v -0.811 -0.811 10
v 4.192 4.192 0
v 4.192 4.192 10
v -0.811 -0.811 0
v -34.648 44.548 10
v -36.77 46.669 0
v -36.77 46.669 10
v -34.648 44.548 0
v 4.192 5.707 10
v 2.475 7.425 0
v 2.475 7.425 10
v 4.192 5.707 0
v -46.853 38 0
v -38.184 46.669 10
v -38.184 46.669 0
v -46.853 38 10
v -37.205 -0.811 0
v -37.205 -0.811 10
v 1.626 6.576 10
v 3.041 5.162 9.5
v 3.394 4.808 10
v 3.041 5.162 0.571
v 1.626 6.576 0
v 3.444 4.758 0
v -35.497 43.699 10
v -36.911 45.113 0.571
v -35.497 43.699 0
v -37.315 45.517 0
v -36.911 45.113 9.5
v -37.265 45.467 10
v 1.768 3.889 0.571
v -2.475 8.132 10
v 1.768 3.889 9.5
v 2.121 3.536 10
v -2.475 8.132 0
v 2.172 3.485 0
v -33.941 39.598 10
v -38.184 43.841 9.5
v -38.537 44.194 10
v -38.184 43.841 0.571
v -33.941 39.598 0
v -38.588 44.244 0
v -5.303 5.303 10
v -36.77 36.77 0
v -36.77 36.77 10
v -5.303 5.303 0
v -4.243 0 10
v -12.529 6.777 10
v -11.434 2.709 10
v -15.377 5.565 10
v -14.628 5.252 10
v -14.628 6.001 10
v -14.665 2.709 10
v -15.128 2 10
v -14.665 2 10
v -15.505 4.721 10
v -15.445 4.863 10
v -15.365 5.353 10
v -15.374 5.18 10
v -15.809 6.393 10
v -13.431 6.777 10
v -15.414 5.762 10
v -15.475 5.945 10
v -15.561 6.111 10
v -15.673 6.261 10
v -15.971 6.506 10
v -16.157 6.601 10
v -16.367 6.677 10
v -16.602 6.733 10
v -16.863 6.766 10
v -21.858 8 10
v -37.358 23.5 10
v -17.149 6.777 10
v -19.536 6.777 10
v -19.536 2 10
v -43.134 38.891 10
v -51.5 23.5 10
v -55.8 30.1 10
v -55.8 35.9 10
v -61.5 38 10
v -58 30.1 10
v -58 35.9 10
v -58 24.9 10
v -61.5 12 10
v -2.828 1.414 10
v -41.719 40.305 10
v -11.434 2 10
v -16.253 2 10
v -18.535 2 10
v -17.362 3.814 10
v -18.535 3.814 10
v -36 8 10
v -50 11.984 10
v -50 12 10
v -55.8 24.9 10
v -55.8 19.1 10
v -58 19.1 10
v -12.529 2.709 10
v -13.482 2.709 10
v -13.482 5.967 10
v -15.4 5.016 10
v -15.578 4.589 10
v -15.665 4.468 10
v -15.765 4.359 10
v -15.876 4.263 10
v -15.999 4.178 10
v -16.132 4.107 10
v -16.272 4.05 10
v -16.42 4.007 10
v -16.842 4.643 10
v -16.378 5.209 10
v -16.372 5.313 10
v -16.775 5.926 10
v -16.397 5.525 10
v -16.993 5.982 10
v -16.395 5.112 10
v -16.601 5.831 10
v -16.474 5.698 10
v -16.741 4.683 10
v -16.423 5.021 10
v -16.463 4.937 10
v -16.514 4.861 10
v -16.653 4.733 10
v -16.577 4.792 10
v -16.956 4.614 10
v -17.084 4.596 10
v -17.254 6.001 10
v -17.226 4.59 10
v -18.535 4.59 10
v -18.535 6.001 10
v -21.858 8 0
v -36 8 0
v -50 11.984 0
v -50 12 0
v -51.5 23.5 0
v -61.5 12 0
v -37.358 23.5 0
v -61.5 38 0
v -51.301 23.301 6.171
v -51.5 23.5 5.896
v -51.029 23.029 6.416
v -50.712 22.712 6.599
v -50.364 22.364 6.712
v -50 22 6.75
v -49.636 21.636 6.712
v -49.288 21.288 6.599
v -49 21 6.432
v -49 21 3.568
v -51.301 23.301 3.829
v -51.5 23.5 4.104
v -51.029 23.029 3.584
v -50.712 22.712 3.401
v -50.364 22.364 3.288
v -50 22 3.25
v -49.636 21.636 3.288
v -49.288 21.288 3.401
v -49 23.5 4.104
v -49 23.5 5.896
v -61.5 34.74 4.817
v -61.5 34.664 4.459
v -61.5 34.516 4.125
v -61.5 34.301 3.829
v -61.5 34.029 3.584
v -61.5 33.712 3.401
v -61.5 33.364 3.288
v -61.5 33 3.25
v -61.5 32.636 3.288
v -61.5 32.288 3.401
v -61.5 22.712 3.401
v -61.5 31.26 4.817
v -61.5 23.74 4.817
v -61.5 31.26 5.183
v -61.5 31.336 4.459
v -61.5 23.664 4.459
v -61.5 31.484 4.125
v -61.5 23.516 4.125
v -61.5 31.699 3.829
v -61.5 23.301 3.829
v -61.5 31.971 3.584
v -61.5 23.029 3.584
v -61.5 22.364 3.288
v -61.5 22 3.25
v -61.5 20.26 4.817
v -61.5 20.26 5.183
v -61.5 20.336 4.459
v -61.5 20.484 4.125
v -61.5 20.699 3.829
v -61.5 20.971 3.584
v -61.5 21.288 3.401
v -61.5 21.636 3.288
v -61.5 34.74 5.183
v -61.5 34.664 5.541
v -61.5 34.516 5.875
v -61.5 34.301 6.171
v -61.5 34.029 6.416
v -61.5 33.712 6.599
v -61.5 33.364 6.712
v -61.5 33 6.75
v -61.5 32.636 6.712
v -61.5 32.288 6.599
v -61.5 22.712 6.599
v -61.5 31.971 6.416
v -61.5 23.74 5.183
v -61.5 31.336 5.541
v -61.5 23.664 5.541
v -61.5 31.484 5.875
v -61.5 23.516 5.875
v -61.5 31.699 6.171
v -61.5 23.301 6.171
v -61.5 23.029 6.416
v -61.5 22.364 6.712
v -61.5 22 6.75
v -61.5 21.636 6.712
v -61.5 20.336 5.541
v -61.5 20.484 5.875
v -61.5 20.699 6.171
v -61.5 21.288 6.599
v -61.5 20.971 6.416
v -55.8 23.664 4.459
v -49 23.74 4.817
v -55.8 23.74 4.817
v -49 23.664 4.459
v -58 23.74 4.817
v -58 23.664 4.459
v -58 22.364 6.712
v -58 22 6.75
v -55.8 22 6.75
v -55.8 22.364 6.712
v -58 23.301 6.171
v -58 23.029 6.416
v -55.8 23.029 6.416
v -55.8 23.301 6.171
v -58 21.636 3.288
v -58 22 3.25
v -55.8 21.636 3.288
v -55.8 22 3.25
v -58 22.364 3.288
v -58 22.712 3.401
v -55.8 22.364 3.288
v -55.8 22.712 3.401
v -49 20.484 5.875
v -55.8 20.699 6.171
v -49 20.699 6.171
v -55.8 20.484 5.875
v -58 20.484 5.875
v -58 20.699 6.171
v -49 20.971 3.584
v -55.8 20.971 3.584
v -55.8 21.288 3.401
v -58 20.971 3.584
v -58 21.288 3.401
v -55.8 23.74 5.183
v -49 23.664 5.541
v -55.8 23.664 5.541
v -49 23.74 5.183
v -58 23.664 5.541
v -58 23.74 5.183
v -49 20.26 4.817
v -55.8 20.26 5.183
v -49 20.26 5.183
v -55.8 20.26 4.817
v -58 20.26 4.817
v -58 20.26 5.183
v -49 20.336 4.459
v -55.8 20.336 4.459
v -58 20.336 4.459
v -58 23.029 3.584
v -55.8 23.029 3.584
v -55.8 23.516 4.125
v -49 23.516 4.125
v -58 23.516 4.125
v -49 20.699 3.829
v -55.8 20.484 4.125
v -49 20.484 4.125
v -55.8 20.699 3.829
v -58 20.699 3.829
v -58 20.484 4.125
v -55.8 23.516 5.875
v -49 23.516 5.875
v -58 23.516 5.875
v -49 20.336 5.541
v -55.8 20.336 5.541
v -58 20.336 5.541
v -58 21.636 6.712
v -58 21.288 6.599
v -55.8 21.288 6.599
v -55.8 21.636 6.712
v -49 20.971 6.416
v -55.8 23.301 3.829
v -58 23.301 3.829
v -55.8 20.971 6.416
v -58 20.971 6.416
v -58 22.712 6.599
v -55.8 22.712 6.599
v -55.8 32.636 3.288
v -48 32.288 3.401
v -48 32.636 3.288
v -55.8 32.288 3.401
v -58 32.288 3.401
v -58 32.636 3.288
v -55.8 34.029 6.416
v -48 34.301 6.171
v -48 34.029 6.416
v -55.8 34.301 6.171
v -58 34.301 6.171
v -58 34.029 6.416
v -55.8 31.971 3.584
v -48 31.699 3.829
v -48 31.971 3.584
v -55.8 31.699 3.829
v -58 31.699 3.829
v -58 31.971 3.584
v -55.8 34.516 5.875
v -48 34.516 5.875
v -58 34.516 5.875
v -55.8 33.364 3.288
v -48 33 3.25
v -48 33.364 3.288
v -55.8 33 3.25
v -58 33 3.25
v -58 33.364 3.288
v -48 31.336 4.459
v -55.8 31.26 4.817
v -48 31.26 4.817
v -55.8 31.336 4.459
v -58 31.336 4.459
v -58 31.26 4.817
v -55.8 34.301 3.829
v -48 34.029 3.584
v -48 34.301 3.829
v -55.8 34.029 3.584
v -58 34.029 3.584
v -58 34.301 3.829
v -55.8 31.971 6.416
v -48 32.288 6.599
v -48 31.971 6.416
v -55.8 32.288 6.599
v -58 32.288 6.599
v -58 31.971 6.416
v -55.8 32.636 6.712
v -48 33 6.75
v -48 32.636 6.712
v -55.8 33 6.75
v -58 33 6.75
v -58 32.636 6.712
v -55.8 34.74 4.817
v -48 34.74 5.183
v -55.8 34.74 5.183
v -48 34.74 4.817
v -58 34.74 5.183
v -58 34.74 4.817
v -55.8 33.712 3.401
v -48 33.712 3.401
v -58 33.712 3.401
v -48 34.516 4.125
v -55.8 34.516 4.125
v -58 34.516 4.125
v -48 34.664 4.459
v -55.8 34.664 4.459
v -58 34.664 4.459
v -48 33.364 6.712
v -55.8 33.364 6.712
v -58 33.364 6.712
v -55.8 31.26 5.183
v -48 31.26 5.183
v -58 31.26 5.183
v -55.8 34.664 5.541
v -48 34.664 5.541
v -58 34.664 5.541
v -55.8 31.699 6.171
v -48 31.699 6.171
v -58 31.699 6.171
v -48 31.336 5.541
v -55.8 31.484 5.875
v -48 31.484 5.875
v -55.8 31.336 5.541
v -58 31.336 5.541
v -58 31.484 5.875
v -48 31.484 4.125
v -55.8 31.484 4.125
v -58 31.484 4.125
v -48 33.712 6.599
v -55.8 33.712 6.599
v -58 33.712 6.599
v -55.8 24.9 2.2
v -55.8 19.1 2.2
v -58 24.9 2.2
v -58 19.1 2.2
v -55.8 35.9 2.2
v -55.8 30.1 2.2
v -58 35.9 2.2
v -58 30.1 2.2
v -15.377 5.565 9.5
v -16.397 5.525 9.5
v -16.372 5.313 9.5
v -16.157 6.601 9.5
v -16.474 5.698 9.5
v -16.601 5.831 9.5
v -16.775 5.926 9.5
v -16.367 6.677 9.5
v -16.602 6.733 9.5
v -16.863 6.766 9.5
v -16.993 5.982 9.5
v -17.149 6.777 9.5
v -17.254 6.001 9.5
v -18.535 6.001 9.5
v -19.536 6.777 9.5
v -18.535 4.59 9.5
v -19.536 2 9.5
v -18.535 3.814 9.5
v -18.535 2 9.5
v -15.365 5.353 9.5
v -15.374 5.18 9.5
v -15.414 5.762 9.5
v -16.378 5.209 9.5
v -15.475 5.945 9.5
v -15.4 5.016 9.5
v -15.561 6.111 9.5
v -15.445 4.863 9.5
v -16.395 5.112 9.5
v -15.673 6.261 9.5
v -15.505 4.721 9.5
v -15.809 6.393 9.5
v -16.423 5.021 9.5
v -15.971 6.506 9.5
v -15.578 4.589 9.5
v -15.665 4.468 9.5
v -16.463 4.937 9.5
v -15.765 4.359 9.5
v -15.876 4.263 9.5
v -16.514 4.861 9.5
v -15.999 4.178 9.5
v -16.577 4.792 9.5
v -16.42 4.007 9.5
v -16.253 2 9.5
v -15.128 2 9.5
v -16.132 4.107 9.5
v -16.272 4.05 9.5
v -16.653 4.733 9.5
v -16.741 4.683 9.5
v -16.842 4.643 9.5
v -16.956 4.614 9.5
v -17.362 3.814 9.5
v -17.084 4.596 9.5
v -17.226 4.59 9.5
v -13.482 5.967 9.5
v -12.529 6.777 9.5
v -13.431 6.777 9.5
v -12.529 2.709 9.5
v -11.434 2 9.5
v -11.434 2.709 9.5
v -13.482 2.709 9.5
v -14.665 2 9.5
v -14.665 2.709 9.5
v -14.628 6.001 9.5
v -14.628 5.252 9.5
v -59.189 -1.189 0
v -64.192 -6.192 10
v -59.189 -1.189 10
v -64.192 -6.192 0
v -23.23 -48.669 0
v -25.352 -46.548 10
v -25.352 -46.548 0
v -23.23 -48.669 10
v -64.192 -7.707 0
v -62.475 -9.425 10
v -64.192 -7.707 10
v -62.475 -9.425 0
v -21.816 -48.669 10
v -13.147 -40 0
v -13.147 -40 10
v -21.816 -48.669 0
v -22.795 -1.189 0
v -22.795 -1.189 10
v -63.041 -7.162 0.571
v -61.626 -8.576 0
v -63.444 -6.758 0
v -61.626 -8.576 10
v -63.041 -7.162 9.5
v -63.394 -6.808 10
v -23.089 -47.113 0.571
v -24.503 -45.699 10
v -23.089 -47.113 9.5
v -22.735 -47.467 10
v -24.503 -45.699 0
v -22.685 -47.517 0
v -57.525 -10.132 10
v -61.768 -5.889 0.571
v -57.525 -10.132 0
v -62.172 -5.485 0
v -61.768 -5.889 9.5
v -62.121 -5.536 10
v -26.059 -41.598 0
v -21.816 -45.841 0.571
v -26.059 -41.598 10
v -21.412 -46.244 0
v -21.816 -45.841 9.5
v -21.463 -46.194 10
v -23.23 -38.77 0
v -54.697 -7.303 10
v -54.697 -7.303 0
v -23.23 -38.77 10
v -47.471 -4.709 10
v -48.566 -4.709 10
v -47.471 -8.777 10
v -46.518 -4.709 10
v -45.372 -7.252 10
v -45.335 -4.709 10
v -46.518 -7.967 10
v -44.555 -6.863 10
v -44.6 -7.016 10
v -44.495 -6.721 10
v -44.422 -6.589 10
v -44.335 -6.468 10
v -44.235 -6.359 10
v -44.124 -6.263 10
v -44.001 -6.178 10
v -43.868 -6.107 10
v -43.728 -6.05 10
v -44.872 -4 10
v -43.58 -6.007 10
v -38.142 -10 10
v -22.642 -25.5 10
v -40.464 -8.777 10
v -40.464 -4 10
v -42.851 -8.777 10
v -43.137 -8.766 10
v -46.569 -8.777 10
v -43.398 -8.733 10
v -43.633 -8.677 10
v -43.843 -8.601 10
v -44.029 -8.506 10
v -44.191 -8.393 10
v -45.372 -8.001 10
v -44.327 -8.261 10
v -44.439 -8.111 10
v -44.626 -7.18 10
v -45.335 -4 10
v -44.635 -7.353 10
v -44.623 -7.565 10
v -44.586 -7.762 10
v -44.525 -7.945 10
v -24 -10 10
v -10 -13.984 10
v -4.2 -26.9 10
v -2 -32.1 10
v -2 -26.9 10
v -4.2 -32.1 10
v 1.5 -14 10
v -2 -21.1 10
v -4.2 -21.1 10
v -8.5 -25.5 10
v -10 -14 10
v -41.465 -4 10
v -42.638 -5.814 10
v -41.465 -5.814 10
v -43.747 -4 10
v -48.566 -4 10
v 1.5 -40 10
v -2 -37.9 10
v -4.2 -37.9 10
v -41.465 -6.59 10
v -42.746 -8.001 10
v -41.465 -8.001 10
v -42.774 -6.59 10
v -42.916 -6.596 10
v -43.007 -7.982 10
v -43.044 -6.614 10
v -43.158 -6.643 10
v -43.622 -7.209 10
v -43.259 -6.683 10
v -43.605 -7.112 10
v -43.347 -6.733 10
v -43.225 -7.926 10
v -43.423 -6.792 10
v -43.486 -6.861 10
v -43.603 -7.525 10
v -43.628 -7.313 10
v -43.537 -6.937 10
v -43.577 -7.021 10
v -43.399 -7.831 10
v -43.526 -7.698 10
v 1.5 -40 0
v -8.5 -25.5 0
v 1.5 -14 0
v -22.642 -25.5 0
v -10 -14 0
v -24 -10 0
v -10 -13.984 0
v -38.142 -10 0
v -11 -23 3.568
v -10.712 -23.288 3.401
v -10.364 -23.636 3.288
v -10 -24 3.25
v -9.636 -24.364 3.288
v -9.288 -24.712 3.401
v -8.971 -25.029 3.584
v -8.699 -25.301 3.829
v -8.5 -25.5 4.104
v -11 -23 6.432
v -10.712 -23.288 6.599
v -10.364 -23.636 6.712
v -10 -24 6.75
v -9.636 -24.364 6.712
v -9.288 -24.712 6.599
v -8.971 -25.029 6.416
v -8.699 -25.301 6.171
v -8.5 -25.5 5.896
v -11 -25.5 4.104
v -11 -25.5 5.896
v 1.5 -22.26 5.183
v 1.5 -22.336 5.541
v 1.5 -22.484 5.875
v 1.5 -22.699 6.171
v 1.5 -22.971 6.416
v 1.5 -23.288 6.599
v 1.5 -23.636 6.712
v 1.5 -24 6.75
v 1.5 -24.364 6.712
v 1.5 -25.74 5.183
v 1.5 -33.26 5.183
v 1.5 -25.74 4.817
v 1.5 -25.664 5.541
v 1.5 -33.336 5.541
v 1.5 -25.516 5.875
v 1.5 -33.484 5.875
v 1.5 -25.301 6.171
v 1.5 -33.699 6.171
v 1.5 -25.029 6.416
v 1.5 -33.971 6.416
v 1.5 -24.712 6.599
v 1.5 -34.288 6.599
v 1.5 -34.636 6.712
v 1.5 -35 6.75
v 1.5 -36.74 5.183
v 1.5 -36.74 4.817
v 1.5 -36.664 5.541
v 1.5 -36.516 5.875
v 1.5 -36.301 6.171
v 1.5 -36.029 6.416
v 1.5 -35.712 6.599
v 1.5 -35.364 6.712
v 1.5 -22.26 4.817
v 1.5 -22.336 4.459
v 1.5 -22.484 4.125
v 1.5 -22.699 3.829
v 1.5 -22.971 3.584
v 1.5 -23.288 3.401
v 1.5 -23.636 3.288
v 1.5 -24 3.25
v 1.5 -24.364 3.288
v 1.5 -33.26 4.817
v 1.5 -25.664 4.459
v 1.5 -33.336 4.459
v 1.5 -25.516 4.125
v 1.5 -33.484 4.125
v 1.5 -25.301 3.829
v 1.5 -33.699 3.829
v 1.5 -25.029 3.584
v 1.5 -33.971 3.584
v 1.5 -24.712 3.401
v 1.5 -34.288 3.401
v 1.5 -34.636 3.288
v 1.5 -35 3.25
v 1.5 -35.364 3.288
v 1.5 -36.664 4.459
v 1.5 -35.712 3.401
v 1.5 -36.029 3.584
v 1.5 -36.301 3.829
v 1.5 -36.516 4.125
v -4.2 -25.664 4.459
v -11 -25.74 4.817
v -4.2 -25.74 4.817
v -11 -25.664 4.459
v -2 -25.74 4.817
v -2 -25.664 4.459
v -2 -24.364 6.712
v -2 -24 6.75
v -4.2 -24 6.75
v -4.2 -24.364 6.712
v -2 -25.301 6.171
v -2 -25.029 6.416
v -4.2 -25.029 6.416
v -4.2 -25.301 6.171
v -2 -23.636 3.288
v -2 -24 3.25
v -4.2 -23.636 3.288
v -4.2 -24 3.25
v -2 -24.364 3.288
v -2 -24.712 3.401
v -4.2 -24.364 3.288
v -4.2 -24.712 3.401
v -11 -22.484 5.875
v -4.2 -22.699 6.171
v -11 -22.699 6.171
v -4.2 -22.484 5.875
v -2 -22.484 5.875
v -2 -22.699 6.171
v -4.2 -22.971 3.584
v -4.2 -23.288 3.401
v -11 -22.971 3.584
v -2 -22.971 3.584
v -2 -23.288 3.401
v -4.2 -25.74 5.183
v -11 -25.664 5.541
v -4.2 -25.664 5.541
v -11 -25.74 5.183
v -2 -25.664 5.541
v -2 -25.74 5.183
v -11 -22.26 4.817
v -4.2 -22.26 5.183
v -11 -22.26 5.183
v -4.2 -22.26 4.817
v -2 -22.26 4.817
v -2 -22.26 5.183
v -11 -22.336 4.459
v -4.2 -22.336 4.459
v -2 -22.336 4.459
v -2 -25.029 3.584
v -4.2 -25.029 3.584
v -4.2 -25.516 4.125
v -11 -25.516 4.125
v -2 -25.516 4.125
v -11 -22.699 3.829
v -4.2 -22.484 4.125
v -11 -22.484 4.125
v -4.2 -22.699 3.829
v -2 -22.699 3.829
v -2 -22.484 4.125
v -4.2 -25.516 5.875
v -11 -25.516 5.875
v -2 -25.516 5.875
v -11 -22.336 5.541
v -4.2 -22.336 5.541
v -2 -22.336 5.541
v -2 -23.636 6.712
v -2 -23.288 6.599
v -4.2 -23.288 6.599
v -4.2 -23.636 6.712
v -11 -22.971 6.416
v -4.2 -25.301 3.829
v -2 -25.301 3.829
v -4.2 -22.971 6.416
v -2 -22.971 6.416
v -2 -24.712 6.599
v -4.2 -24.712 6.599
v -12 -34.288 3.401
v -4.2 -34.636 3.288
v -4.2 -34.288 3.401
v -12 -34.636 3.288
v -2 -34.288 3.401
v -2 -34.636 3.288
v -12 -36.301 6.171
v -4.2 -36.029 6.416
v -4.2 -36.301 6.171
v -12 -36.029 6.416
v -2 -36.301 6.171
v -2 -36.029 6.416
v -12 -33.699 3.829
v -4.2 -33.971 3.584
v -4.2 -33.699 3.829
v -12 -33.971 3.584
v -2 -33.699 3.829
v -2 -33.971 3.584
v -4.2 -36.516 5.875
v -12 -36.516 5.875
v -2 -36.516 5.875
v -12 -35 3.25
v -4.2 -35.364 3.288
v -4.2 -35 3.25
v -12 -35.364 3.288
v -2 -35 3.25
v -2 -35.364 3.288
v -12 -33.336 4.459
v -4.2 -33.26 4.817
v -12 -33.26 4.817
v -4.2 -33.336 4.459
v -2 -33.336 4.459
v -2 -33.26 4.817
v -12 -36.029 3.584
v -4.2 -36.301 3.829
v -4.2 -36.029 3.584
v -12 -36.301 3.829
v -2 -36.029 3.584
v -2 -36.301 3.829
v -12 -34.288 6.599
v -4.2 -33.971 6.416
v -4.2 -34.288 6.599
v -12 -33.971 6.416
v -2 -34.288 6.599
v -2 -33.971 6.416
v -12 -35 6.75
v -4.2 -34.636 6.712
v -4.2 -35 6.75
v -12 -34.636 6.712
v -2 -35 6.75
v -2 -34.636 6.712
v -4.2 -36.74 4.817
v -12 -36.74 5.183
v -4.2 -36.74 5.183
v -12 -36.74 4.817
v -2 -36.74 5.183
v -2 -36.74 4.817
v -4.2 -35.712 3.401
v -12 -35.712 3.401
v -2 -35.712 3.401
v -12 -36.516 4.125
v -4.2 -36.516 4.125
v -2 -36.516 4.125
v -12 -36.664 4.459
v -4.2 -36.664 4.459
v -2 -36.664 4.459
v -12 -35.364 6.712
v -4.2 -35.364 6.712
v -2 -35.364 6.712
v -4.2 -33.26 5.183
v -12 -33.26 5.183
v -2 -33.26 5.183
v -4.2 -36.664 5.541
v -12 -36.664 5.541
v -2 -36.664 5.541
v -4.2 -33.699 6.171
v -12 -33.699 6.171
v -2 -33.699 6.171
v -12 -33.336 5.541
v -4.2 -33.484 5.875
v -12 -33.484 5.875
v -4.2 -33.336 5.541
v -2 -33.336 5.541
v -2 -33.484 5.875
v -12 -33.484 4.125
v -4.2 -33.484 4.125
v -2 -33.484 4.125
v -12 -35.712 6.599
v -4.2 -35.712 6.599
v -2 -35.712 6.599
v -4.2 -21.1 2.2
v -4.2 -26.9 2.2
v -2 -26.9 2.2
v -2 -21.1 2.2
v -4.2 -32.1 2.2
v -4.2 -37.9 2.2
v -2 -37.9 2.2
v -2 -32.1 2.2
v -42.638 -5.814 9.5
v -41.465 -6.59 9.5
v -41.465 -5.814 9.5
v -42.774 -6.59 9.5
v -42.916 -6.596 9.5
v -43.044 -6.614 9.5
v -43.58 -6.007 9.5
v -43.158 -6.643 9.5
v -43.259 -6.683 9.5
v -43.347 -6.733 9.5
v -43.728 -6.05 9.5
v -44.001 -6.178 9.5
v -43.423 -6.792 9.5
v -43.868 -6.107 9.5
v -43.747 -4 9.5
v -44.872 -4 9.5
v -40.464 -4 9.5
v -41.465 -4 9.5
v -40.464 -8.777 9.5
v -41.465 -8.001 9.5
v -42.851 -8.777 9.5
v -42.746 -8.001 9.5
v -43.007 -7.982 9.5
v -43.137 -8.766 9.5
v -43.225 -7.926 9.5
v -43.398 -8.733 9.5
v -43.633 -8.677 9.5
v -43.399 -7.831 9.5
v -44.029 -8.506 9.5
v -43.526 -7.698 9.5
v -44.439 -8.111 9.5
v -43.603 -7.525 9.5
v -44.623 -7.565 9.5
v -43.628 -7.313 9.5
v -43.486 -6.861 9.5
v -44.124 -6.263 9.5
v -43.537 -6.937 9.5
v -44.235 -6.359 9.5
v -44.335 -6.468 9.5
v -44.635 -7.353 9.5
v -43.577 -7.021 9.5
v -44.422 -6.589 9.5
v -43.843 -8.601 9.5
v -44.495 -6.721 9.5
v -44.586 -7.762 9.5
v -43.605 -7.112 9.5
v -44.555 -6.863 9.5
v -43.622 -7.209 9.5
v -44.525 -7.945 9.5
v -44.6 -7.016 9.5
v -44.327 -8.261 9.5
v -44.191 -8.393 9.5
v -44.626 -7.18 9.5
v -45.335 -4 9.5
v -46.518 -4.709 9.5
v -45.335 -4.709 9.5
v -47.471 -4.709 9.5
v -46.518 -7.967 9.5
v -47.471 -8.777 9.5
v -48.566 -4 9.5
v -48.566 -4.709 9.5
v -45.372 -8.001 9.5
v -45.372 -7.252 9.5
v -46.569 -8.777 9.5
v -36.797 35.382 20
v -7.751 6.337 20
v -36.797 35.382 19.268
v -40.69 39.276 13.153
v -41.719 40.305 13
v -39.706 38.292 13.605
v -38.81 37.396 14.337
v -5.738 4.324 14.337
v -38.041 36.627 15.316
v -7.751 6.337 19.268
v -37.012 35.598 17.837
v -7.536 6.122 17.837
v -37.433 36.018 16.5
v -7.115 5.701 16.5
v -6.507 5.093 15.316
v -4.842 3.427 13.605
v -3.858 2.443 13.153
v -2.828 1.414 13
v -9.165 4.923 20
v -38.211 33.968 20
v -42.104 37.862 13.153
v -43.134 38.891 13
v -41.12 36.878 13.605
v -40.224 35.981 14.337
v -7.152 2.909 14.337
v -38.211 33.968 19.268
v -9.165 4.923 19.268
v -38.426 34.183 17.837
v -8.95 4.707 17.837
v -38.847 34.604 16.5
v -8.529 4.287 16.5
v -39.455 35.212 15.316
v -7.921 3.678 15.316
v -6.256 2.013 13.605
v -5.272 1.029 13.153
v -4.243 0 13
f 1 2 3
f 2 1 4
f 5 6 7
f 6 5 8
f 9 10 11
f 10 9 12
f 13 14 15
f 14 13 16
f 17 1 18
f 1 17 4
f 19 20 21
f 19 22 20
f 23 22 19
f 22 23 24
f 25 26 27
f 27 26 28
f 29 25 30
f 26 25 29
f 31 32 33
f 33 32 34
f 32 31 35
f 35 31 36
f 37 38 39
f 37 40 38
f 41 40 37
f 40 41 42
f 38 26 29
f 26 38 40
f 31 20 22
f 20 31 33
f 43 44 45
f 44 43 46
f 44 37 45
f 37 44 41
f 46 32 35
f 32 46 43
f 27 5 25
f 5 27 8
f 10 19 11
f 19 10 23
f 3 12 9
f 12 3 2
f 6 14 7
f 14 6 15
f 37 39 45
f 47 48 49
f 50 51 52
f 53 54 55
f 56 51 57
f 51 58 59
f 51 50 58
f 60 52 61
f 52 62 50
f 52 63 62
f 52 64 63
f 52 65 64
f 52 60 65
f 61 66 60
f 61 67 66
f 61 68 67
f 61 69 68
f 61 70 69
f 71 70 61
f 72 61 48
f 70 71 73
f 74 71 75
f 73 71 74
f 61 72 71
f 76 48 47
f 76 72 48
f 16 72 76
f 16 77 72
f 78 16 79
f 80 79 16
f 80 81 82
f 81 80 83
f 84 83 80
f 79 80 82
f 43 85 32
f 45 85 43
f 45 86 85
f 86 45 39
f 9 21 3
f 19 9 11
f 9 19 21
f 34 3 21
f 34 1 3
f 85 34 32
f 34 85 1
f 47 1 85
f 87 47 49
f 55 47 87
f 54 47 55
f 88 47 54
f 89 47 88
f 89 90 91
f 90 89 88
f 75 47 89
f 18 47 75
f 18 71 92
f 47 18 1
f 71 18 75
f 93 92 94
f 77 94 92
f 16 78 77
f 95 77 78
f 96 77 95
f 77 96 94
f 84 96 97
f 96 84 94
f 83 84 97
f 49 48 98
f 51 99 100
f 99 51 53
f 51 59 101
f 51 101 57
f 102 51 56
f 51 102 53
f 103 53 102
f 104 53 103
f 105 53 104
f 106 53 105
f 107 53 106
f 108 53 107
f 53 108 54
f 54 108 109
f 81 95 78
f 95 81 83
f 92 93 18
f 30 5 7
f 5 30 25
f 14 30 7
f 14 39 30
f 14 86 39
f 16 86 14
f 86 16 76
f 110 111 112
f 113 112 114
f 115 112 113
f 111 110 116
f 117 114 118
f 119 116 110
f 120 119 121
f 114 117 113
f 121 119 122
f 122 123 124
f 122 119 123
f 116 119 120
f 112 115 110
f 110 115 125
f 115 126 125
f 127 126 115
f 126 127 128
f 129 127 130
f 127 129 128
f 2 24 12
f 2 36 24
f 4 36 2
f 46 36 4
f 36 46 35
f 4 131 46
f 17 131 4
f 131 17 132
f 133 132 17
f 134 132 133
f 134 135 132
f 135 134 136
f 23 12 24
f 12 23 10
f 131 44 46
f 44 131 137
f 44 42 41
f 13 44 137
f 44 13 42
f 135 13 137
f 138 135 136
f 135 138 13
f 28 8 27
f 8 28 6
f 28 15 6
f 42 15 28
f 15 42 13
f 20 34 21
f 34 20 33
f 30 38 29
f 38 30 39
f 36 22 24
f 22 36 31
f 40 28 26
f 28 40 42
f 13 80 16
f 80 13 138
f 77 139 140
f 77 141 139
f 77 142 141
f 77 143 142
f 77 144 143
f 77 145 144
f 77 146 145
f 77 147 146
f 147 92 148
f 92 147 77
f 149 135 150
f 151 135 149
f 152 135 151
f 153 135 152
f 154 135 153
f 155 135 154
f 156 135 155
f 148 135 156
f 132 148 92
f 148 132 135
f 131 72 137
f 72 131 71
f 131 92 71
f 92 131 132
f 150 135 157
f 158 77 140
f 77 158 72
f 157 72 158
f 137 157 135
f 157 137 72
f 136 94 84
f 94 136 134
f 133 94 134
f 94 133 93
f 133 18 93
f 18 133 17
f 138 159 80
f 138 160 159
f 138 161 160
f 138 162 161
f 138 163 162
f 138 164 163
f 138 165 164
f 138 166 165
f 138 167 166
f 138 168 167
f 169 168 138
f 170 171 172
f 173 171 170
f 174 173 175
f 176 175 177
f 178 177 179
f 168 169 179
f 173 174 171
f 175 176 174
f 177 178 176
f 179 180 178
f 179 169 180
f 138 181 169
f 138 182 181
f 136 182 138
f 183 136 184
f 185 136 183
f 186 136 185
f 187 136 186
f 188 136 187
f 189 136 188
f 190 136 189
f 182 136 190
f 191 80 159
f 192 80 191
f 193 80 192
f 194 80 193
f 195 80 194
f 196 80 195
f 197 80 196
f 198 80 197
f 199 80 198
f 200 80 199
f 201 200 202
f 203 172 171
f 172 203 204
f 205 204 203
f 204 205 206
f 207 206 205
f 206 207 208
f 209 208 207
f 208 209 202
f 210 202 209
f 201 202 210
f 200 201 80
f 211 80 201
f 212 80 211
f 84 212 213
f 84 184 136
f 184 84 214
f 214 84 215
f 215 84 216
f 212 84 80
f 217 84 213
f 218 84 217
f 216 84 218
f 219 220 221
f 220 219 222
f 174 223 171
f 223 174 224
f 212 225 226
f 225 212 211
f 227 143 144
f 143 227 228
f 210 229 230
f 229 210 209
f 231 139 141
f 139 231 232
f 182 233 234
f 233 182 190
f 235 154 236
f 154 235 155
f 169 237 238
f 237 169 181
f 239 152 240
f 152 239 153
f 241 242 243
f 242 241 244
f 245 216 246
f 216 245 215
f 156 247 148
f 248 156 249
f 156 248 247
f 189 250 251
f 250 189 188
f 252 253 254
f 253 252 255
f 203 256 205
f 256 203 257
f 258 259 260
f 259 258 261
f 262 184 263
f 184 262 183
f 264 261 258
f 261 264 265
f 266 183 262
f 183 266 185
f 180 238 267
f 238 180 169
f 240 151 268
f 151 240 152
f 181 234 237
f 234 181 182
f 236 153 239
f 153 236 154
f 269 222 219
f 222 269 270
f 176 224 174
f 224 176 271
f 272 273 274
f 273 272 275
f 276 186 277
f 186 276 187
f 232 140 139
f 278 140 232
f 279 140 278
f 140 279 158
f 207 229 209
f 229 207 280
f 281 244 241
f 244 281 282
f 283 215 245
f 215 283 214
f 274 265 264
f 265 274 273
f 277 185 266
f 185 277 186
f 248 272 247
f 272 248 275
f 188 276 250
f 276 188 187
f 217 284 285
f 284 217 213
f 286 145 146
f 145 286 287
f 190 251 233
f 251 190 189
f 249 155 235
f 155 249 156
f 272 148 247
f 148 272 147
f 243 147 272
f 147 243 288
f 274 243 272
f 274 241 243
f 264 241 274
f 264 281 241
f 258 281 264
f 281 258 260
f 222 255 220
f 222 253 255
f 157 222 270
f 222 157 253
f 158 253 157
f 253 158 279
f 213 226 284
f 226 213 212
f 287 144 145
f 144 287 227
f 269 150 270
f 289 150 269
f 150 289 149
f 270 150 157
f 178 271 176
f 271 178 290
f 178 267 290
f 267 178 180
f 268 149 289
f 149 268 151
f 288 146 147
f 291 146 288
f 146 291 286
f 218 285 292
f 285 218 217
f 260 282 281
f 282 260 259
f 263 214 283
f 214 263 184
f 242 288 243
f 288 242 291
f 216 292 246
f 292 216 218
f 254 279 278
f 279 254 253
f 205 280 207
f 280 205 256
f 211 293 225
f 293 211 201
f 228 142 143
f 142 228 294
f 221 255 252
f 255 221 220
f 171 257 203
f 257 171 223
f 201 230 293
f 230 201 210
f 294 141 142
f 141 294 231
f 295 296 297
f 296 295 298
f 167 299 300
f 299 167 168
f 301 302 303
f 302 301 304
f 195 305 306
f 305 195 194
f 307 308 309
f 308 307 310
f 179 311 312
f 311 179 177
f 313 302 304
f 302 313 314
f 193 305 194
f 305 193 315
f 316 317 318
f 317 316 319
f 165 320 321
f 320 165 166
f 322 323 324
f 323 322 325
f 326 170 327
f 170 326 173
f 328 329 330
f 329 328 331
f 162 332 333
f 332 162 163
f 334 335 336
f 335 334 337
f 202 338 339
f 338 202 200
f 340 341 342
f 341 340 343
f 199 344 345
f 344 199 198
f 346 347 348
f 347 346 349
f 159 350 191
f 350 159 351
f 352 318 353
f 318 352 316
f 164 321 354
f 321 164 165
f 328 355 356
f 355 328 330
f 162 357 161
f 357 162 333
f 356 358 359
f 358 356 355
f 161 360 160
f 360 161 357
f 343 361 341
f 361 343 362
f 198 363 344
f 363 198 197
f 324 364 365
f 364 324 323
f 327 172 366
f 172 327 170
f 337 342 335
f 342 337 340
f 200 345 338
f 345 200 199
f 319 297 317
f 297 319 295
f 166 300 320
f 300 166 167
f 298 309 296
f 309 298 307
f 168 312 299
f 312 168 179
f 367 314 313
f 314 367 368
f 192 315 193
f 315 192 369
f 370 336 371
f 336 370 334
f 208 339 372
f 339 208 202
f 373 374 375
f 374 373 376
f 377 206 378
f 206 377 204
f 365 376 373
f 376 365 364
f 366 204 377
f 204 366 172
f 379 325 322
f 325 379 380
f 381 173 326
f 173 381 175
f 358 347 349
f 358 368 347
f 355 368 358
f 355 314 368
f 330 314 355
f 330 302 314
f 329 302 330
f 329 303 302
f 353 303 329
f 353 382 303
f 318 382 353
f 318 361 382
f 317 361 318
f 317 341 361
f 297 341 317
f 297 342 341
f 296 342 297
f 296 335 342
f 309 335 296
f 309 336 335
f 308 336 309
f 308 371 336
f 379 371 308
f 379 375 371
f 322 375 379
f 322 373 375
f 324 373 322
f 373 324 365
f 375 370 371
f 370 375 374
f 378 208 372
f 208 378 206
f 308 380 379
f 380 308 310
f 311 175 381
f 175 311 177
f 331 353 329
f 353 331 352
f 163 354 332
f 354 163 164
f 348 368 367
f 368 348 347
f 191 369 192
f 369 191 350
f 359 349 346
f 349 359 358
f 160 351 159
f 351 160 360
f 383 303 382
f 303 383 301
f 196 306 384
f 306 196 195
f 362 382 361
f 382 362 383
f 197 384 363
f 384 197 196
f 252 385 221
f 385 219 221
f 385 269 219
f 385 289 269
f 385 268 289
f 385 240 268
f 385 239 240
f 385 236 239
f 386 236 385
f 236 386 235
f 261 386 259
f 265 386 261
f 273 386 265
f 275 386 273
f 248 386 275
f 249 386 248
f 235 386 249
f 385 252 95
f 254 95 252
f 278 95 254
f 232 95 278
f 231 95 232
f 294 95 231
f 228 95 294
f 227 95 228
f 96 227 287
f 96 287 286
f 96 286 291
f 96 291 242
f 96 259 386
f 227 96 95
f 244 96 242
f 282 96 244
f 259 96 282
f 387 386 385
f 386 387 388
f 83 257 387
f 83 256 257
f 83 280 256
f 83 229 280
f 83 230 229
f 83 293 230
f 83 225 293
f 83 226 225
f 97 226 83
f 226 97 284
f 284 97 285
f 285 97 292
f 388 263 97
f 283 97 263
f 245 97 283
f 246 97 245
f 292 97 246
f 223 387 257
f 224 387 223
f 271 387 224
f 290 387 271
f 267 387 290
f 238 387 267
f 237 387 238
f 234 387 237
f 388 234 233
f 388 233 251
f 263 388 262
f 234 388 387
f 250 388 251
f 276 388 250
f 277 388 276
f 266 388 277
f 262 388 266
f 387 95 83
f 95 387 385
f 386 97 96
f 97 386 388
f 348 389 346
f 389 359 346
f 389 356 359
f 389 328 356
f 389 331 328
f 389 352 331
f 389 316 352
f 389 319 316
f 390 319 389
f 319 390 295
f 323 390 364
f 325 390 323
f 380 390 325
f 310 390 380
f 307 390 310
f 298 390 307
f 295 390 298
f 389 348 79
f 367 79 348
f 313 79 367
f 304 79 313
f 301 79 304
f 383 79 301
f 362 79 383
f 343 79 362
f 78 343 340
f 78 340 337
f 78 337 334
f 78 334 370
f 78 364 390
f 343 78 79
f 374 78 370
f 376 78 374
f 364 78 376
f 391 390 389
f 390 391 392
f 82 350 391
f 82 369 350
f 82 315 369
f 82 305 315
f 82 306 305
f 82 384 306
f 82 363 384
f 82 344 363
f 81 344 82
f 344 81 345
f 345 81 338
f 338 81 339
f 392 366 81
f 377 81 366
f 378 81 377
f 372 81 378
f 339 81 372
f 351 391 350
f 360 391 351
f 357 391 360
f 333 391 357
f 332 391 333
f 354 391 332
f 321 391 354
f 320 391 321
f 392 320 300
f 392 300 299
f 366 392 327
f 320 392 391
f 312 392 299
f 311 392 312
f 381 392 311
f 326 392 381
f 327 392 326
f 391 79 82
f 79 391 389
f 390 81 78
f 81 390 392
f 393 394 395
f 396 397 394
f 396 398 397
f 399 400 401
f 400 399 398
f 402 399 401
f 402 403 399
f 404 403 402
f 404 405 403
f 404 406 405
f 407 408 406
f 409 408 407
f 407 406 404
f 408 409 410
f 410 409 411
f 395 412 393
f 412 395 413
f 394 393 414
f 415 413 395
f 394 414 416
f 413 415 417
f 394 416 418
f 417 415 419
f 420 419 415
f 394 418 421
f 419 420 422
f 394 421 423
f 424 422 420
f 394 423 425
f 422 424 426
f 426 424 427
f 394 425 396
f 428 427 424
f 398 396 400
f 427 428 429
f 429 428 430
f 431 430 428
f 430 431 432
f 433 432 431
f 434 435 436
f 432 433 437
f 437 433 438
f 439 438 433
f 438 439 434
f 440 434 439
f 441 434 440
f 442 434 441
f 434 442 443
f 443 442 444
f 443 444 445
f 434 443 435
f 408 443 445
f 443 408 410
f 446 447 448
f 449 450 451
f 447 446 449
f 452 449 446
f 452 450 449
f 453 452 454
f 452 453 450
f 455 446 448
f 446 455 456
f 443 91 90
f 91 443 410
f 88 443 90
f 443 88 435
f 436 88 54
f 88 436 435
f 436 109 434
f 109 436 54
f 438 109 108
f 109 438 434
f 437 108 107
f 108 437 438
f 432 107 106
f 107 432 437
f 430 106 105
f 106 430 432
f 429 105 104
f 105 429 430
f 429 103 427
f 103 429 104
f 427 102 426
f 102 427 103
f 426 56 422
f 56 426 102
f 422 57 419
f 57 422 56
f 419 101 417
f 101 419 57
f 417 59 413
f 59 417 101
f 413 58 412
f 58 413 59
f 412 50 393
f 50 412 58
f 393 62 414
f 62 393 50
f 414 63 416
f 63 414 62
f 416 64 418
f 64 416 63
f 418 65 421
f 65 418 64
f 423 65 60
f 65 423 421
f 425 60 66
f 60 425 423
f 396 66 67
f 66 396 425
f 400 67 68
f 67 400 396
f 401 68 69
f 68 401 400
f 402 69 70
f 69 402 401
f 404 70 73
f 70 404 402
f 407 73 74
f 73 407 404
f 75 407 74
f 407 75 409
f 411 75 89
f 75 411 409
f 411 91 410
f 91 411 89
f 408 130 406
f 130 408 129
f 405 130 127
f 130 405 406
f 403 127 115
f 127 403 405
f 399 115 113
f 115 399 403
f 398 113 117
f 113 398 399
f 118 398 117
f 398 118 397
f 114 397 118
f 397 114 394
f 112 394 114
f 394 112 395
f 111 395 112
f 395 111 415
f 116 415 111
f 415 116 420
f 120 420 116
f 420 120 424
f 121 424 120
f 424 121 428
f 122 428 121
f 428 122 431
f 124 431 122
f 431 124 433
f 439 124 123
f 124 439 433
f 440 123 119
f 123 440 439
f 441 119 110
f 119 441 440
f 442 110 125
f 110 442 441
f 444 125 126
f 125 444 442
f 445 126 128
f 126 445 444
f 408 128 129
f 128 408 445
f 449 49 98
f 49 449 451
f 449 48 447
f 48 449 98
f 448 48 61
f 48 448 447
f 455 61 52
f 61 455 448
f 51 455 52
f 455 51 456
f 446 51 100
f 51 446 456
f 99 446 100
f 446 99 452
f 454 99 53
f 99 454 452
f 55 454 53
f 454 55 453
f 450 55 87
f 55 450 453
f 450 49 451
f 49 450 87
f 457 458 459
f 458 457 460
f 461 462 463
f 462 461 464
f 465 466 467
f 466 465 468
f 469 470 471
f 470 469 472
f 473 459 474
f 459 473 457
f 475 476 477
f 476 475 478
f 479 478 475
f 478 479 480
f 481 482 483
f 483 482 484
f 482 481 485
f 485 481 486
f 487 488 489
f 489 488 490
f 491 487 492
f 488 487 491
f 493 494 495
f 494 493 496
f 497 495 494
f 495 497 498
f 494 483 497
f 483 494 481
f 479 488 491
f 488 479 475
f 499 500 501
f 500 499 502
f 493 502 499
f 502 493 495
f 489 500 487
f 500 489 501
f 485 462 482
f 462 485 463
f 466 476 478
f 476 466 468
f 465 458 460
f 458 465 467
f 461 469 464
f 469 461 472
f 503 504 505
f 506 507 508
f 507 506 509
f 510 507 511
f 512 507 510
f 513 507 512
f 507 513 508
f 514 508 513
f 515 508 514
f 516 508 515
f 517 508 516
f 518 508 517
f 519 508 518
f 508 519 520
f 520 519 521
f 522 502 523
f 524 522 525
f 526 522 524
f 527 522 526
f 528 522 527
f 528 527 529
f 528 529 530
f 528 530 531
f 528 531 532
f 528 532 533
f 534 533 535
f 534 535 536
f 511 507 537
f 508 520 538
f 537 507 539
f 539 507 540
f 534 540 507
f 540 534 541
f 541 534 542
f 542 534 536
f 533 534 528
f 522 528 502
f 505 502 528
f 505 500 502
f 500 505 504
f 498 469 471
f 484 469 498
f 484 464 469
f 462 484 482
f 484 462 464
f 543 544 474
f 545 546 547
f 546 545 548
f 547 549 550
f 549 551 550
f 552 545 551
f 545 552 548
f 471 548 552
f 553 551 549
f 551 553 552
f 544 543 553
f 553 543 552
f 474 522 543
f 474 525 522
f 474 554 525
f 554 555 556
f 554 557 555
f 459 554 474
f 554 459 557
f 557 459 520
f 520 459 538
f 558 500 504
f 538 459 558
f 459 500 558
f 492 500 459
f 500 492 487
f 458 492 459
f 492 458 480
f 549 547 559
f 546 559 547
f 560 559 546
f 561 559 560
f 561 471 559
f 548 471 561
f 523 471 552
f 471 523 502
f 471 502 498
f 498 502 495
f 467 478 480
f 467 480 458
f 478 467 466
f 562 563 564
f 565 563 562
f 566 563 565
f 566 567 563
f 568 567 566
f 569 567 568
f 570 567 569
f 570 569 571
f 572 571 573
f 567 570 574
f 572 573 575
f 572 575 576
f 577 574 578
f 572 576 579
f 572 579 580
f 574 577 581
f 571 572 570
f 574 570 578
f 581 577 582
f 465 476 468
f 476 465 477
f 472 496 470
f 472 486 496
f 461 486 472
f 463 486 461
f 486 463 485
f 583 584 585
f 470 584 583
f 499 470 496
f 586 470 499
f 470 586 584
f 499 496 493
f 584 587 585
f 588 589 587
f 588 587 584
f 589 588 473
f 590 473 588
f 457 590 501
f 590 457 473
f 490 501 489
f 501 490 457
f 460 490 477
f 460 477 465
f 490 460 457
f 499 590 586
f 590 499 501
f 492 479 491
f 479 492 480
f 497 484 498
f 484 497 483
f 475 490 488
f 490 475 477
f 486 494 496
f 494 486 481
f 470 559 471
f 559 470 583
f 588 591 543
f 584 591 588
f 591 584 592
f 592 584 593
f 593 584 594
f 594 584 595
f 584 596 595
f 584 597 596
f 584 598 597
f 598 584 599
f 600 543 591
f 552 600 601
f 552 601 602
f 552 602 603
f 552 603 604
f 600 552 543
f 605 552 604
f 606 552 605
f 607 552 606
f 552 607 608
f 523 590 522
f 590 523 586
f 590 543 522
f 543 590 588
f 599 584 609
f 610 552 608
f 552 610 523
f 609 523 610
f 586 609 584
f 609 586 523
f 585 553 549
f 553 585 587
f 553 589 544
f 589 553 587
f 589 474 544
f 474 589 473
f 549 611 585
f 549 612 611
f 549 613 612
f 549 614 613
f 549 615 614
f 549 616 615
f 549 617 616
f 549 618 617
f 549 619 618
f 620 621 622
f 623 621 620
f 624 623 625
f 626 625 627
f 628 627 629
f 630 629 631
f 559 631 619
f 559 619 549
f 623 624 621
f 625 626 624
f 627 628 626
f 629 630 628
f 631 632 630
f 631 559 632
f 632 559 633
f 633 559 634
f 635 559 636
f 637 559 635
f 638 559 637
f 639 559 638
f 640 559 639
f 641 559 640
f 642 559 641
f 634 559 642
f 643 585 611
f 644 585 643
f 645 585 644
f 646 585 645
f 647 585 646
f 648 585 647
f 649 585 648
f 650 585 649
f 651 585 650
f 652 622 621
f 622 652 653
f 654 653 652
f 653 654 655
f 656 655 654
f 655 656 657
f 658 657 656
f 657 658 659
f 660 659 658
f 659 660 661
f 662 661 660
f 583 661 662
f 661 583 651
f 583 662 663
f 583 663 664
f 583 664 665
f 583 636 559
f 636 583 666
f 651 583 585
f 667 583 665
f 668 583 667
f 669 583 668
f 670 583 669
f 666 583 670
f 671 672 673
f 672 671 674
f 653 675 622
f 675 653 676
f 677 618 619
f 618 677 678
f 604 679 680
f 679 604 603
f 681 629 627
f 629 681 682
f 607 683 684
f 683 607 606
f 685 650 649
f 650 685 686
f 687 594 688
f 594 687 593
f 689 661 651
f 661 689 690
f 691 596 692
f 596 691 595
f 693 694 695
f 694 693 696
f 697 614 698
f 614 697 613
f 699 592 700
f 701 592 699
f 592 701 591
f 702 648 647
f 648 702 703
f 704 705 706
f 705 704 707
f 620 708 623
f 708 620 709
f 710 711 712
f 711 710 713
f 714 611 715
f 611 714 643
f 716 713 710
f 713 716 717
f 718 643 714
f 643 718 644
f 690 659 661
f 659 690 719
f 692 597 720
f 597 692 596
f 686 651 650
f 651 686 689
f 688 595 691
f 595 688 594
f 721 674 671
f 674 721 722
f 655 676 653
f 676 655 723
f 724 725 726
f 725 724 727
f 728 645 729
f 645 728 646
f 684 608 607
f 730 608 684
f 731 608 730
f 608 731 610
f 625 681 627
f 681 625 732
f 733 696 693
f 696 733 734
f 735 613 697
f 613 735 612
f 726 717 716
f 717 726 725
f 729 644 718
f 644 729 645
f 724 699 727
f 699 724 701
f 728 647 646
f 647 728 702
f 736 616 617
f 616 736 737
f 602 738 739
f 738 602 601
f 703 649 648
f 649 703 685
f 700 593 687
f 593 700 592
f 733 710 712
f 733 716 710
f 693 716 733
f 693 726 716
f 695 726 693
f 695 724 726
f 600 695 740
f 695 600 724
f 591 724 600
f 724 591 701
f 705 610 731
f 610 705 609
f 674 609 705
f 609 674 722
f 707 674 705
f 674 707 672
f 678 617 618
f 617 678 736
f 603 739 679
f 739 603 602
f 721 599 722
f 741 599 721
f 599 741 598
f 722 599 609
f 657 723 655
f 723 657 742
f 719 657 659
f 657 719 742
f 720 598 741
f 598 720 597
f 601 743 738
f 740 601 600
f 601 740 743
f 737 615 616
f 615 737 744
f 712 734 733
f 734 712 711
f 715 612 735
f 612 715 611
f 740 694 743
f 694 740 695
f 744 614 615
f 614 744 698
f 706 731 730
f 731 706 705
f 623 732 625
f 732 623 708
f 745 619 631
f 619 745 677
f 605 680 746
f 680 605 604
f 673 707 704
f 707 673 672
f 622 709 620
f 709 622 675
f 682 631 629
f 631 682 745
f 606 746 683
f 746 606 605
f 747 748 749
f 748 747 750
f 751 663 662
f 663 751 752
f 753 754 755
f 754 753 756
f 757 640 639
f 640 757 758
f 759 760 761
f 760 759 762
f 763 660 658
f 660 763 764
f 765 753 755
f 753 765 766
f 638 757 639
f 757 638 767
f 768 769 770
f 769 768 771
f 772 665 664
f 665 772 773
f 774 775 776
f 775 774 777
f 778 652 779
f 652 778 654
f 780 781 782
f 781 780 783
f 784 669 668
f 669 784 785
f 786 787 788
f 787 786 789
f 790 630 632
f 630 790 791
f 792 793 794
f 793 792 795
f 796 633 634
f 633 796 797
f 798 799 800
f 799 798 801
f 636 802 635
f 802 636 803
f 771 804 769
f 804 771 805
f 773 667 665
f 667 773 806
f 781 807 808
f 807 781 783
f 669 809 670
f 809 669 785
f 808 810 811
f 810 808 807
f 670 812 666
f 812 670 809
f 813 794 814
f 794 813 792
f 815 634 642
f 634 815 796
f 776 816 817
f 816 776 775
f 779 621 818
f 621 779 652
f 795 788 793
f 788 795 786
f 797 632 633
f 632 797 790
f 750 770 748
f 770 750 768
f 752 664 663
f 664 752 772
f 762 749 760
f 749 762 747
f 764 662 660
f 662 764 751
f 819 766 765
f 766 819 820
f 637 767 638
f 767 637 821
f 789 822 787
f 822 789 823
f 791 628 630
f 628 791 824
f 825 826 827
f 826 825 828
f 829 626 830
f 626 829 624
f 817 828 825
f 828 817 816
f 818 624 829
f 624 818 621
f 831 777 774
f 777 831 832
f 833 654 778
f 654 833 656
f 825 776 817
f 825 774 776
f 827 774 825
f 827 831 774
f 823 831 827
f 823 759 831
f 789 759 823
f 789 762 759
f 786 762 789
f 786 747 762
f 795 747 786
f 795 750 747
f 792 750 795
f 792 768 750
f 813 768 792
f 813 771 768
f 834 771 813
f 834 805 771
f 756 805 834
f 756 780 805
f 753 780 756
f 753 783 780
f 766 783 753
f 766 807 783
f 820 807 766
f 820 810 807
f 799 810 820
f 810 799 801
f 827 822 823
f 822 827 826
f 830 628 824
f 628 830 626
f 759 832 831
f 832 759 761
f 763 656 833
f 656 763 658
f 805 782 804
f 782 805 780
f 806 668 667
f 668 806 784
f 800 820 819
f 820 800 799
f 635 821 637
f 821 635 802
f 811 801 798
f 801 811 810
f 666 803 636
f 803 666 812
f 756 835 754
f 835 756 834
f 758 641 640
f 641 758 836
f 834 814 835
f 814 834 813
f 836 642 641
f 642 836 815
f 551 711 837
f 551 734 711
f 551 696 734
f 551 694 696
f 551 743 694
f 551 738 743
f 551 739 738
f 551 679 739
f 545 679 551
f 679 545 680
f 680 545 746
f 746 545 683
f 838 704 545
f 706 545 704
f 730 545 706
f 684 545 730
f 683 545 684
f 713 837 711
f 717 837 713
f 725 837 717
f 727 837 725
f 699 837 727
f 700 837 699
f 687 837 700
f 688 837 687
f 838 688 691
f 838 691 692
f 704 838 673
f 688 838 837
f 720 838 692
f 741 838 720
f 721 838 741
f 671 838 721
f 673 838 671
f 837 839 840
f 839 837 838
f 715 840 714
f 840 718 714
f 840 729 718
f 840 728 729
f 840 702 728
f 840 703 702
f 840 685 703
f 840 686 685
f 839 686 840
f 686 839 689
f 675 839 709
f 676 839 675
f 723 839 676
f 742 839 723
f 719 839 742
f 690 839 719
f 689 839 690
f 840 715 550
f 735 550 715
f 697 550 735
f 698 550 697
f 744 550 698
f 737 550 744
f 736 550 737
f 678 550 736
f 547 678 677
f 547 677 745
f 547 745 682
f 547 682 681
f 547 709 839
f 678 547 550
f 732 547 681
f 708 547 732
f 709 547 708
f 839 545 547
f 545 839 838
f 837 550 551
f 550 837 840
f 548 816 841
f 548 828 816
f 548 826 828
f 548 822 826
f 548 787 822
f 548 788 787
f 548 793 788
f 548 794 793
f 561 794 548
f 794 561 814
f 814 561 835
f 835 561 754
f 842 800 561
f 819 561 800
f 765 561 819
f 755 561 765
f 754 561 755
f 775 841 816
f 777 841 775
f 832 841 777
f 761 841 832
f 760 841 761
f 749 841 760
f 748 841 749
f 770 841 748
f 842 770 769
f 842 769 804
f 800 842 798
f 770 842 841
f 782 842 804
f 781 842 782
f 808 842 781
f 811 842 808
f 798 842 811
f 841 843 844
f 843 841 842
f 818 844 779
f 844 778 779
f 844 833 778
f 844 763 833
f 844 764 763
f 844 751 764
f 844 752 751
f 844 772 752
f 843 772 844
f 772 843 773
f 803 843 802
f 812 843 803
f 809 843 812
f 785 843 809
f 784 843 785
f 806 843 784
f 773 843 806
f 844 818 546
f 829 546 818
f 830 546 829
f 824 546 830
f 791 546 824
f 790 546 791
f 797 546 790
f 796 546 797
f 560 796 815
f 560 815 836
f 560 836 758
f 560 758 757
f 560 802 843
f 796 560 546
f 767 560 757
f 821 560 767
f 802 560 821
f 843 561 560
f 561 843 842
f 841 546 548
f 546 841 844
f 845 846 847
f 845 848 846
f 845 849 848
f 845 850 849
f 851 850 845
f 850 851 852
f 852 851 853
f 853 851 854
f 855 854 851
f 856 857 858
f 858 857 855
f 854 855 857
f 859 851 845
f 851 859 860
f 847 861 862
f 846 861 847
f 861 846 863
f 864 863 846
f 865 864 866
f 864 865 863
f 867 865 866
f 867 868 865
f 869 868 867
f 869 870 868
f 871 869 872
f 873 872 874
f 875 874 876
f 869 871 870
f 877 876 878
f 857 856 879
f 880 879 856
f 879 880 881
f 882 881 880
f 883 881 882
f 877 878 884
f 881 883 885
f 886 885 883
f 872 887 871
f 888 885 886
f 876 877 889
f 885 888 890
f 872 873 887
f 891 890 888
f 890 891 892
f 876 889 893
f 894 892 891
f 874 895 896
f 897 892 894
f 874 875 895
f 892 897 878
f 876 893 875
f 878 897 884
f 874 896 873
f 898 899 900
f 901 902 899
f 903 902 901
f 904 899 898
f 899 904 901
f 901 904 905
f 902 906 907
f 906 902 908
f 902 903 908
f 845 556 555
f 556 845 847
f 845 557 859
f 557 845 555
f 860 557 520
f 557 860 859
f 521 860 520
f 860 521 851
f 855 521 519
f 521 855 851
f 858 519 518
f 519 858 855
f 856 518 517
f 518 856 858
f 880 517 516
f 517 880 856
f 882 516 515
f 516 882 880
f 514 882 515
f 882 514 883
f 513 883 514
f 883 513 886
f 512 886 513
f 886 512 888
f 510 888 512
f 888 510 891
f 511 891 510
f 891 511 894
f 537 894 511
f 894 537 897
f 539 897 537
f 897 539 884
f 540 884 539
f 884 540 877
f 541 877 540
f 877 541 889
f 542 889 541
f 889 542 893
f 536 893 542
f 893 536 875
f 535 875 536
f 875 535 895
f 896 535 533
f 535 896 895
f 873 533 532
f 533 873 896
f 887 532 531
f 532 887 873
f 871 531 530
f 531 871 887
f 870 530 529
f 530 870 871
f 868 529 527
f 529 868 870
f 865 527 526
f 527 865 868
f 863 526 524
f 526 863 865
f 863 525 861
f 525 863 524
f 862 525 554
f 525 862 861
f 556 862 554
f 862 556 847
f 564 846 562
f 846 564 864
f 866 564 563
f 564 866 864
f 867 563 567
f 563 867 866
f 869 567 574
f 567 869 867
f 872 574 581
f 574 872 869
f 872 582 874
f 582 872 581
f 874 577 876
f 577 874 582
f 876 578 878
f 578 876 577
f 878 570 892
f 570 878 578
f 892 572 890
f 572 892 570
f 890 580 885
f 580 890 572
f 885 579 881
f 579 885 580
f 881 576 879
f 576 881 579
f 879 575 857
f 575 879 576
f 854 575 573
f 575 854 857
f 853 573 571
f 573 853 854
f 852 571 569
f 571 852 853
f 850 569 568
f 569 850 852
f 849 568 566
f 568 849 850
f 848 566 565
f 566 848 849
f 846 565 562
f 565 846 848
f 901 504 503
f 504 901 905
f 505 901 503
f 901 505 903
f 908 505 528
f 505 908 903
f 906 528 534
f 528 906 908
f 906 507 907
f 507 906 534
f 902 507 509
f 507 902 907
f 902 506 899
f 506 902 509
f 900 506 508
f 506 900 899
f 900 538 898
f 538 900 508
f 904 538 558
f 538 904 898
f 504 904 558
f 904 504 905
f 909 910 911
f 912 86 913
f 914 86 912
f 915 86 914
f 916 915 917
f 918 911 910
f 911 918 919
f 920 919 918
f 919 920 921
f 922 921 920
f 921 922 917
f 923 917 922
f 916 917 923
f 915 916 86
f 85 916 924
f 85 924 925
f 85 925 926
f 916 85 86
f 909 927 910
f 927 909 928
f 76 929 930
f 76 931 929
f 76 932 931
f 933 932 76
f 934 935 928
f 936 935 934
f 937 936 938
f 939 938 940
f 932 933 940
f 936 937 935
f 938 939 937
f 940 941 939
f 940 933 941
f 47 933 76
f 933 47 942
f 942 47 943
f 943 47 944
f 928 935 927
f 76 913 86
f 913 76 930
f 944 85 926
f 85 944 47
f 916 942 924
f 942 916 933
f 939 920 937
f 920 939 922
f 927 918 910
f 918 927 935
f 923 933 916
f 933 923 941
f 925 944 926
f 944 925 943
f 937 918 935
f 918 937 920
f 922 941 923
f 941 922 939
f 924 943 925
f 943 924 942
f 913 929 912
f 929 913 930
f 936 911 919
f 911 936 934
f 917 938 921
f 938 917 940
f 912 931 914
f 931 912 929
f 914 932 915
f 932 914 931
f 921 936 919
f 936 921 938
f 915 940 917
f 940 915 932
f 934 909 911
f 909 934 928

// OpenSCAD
// PRUSA iteration4
// lcd supports
// GNU GPL v3
// Josef Průša <iam@josefprusa.cz> and contributors
// http://www.reprap.org/wiki/Prusa_Mendel
// http://prusamendel.org

rev = "R1";


module body()
{

    difference() 
        {
        // base block
        translate([-55,-2,0]) cube([69,81,10]); 

            union ()
            {
                // outer body shape
                translate([-69.6,32,-1]) rotate([0,0,45]) cube([60,53,15]); 
                translate([13.7,89.7,-1]) rotate([0,0,135]) cube([60,42,15]);
                translate([-19,-9,-1]) cube([60,9,15] );   
                translate([7,-3,-1]) cube([60,68,16]);  
                translate([-16,60,-1]) cube([60,50,15] );
                translate([-41, -45,-1]) rotate([0,0,45]) cube([60,80,13]);  
                
                // pcb cout out
                translate([4,1.5,-1]) cube([1.8,56.5,17]); 
                translate([0,7.5,-1]) cube([5.8,44.5,17]); 
                translate([4.8,3.5,-1]) cube([5.8,52.5,17]);
                translate([8,-5,-1] ) rotate([0,0,45]) cube([5,5,17]);
                translate([8,58,-1]) rotate([0,0,45]) cube([5,5,17]);
            }

            // pcb inserts
            translate([4,3,8]) rotate([45,0,0]) cube([1.8,5,5]); 
            translate([4,56.5,8]) rotate([45,0,0]) cube([1.8,5,5]);     
            translate([4,3,-5]) rotate([45,0,0]) cube([1.8,5,5]); 
            translate([4,56.5,-5]) rotate([45,0,0]) cube([1.8,5,5]);     
        }
}



module support()
{
    difference() 
    {
    
        union()
        {
            rotate([0,0,45]) body();
            // screw block
            translate([-72,22,0])  cube([30,16,10]);    
        }
        
        // lower angled part cut
        translate([-75,-2,-1])  cube([20,14,15]);    
        translate([-70,-2,-1]) cube([20,14,15]);    
        translate([-50,-16.3,-1]) rotate([0,0,45]) cube([20,20,15]);    
        
        translate([-76.5,-2,-1]) cube([15,40,15]);    
        
        difference()
        {
            translate([-28,0,-1]) rotate([0,0,45]) cube([10,40,15]);    
            translate([-38,-12,-1]) cube([20,20,15]);    
            translate([-58,23.5,-1]) cube([25,25,15]);    
        }
        
        // screw holes
        translate([-71,18+4,5]) rotate([0,90,0]) cylinder(h=22, r=1.75, $fn=30);  
        translate([-70,29+4,5]) rotate([0,90,0]) cylinder(h=22, r=1.75, $fn=30);  
        
        // nut traps
        translate([-58,15.1+4,5-2.8]) cube([2.2,5.8,29.7]);    
        translate([-58,26.1+4,5-2.8]) cube([2.2,5.8,29.7]); 
     
        // version
        translate([-20,2,9.5]) rotate([0,0,0]) linear_extrude(height = 0.6) 
        { text(rev, font = "helvetica:style=Bold", size=5, center=true); }   
    }
}


module left_lcd_support()
{
    support();
     
    rotate([0,0,45]) difference()
    {
        // sd card shield
        translate([-3,3,10])  cube([2,55,10]); 
        translate([-4,3,20]) rotate([0,90,0]) cylinder( h=4, r=7, $fn=30); 
        translate([-4,58,20]) rotate([0,90,0]) cylinder( h=4, r=7, $fn=30); 
    }
}

translate([-60,-2,0]) rotate([0,0,180]) support();
left_lcd_support();

 
